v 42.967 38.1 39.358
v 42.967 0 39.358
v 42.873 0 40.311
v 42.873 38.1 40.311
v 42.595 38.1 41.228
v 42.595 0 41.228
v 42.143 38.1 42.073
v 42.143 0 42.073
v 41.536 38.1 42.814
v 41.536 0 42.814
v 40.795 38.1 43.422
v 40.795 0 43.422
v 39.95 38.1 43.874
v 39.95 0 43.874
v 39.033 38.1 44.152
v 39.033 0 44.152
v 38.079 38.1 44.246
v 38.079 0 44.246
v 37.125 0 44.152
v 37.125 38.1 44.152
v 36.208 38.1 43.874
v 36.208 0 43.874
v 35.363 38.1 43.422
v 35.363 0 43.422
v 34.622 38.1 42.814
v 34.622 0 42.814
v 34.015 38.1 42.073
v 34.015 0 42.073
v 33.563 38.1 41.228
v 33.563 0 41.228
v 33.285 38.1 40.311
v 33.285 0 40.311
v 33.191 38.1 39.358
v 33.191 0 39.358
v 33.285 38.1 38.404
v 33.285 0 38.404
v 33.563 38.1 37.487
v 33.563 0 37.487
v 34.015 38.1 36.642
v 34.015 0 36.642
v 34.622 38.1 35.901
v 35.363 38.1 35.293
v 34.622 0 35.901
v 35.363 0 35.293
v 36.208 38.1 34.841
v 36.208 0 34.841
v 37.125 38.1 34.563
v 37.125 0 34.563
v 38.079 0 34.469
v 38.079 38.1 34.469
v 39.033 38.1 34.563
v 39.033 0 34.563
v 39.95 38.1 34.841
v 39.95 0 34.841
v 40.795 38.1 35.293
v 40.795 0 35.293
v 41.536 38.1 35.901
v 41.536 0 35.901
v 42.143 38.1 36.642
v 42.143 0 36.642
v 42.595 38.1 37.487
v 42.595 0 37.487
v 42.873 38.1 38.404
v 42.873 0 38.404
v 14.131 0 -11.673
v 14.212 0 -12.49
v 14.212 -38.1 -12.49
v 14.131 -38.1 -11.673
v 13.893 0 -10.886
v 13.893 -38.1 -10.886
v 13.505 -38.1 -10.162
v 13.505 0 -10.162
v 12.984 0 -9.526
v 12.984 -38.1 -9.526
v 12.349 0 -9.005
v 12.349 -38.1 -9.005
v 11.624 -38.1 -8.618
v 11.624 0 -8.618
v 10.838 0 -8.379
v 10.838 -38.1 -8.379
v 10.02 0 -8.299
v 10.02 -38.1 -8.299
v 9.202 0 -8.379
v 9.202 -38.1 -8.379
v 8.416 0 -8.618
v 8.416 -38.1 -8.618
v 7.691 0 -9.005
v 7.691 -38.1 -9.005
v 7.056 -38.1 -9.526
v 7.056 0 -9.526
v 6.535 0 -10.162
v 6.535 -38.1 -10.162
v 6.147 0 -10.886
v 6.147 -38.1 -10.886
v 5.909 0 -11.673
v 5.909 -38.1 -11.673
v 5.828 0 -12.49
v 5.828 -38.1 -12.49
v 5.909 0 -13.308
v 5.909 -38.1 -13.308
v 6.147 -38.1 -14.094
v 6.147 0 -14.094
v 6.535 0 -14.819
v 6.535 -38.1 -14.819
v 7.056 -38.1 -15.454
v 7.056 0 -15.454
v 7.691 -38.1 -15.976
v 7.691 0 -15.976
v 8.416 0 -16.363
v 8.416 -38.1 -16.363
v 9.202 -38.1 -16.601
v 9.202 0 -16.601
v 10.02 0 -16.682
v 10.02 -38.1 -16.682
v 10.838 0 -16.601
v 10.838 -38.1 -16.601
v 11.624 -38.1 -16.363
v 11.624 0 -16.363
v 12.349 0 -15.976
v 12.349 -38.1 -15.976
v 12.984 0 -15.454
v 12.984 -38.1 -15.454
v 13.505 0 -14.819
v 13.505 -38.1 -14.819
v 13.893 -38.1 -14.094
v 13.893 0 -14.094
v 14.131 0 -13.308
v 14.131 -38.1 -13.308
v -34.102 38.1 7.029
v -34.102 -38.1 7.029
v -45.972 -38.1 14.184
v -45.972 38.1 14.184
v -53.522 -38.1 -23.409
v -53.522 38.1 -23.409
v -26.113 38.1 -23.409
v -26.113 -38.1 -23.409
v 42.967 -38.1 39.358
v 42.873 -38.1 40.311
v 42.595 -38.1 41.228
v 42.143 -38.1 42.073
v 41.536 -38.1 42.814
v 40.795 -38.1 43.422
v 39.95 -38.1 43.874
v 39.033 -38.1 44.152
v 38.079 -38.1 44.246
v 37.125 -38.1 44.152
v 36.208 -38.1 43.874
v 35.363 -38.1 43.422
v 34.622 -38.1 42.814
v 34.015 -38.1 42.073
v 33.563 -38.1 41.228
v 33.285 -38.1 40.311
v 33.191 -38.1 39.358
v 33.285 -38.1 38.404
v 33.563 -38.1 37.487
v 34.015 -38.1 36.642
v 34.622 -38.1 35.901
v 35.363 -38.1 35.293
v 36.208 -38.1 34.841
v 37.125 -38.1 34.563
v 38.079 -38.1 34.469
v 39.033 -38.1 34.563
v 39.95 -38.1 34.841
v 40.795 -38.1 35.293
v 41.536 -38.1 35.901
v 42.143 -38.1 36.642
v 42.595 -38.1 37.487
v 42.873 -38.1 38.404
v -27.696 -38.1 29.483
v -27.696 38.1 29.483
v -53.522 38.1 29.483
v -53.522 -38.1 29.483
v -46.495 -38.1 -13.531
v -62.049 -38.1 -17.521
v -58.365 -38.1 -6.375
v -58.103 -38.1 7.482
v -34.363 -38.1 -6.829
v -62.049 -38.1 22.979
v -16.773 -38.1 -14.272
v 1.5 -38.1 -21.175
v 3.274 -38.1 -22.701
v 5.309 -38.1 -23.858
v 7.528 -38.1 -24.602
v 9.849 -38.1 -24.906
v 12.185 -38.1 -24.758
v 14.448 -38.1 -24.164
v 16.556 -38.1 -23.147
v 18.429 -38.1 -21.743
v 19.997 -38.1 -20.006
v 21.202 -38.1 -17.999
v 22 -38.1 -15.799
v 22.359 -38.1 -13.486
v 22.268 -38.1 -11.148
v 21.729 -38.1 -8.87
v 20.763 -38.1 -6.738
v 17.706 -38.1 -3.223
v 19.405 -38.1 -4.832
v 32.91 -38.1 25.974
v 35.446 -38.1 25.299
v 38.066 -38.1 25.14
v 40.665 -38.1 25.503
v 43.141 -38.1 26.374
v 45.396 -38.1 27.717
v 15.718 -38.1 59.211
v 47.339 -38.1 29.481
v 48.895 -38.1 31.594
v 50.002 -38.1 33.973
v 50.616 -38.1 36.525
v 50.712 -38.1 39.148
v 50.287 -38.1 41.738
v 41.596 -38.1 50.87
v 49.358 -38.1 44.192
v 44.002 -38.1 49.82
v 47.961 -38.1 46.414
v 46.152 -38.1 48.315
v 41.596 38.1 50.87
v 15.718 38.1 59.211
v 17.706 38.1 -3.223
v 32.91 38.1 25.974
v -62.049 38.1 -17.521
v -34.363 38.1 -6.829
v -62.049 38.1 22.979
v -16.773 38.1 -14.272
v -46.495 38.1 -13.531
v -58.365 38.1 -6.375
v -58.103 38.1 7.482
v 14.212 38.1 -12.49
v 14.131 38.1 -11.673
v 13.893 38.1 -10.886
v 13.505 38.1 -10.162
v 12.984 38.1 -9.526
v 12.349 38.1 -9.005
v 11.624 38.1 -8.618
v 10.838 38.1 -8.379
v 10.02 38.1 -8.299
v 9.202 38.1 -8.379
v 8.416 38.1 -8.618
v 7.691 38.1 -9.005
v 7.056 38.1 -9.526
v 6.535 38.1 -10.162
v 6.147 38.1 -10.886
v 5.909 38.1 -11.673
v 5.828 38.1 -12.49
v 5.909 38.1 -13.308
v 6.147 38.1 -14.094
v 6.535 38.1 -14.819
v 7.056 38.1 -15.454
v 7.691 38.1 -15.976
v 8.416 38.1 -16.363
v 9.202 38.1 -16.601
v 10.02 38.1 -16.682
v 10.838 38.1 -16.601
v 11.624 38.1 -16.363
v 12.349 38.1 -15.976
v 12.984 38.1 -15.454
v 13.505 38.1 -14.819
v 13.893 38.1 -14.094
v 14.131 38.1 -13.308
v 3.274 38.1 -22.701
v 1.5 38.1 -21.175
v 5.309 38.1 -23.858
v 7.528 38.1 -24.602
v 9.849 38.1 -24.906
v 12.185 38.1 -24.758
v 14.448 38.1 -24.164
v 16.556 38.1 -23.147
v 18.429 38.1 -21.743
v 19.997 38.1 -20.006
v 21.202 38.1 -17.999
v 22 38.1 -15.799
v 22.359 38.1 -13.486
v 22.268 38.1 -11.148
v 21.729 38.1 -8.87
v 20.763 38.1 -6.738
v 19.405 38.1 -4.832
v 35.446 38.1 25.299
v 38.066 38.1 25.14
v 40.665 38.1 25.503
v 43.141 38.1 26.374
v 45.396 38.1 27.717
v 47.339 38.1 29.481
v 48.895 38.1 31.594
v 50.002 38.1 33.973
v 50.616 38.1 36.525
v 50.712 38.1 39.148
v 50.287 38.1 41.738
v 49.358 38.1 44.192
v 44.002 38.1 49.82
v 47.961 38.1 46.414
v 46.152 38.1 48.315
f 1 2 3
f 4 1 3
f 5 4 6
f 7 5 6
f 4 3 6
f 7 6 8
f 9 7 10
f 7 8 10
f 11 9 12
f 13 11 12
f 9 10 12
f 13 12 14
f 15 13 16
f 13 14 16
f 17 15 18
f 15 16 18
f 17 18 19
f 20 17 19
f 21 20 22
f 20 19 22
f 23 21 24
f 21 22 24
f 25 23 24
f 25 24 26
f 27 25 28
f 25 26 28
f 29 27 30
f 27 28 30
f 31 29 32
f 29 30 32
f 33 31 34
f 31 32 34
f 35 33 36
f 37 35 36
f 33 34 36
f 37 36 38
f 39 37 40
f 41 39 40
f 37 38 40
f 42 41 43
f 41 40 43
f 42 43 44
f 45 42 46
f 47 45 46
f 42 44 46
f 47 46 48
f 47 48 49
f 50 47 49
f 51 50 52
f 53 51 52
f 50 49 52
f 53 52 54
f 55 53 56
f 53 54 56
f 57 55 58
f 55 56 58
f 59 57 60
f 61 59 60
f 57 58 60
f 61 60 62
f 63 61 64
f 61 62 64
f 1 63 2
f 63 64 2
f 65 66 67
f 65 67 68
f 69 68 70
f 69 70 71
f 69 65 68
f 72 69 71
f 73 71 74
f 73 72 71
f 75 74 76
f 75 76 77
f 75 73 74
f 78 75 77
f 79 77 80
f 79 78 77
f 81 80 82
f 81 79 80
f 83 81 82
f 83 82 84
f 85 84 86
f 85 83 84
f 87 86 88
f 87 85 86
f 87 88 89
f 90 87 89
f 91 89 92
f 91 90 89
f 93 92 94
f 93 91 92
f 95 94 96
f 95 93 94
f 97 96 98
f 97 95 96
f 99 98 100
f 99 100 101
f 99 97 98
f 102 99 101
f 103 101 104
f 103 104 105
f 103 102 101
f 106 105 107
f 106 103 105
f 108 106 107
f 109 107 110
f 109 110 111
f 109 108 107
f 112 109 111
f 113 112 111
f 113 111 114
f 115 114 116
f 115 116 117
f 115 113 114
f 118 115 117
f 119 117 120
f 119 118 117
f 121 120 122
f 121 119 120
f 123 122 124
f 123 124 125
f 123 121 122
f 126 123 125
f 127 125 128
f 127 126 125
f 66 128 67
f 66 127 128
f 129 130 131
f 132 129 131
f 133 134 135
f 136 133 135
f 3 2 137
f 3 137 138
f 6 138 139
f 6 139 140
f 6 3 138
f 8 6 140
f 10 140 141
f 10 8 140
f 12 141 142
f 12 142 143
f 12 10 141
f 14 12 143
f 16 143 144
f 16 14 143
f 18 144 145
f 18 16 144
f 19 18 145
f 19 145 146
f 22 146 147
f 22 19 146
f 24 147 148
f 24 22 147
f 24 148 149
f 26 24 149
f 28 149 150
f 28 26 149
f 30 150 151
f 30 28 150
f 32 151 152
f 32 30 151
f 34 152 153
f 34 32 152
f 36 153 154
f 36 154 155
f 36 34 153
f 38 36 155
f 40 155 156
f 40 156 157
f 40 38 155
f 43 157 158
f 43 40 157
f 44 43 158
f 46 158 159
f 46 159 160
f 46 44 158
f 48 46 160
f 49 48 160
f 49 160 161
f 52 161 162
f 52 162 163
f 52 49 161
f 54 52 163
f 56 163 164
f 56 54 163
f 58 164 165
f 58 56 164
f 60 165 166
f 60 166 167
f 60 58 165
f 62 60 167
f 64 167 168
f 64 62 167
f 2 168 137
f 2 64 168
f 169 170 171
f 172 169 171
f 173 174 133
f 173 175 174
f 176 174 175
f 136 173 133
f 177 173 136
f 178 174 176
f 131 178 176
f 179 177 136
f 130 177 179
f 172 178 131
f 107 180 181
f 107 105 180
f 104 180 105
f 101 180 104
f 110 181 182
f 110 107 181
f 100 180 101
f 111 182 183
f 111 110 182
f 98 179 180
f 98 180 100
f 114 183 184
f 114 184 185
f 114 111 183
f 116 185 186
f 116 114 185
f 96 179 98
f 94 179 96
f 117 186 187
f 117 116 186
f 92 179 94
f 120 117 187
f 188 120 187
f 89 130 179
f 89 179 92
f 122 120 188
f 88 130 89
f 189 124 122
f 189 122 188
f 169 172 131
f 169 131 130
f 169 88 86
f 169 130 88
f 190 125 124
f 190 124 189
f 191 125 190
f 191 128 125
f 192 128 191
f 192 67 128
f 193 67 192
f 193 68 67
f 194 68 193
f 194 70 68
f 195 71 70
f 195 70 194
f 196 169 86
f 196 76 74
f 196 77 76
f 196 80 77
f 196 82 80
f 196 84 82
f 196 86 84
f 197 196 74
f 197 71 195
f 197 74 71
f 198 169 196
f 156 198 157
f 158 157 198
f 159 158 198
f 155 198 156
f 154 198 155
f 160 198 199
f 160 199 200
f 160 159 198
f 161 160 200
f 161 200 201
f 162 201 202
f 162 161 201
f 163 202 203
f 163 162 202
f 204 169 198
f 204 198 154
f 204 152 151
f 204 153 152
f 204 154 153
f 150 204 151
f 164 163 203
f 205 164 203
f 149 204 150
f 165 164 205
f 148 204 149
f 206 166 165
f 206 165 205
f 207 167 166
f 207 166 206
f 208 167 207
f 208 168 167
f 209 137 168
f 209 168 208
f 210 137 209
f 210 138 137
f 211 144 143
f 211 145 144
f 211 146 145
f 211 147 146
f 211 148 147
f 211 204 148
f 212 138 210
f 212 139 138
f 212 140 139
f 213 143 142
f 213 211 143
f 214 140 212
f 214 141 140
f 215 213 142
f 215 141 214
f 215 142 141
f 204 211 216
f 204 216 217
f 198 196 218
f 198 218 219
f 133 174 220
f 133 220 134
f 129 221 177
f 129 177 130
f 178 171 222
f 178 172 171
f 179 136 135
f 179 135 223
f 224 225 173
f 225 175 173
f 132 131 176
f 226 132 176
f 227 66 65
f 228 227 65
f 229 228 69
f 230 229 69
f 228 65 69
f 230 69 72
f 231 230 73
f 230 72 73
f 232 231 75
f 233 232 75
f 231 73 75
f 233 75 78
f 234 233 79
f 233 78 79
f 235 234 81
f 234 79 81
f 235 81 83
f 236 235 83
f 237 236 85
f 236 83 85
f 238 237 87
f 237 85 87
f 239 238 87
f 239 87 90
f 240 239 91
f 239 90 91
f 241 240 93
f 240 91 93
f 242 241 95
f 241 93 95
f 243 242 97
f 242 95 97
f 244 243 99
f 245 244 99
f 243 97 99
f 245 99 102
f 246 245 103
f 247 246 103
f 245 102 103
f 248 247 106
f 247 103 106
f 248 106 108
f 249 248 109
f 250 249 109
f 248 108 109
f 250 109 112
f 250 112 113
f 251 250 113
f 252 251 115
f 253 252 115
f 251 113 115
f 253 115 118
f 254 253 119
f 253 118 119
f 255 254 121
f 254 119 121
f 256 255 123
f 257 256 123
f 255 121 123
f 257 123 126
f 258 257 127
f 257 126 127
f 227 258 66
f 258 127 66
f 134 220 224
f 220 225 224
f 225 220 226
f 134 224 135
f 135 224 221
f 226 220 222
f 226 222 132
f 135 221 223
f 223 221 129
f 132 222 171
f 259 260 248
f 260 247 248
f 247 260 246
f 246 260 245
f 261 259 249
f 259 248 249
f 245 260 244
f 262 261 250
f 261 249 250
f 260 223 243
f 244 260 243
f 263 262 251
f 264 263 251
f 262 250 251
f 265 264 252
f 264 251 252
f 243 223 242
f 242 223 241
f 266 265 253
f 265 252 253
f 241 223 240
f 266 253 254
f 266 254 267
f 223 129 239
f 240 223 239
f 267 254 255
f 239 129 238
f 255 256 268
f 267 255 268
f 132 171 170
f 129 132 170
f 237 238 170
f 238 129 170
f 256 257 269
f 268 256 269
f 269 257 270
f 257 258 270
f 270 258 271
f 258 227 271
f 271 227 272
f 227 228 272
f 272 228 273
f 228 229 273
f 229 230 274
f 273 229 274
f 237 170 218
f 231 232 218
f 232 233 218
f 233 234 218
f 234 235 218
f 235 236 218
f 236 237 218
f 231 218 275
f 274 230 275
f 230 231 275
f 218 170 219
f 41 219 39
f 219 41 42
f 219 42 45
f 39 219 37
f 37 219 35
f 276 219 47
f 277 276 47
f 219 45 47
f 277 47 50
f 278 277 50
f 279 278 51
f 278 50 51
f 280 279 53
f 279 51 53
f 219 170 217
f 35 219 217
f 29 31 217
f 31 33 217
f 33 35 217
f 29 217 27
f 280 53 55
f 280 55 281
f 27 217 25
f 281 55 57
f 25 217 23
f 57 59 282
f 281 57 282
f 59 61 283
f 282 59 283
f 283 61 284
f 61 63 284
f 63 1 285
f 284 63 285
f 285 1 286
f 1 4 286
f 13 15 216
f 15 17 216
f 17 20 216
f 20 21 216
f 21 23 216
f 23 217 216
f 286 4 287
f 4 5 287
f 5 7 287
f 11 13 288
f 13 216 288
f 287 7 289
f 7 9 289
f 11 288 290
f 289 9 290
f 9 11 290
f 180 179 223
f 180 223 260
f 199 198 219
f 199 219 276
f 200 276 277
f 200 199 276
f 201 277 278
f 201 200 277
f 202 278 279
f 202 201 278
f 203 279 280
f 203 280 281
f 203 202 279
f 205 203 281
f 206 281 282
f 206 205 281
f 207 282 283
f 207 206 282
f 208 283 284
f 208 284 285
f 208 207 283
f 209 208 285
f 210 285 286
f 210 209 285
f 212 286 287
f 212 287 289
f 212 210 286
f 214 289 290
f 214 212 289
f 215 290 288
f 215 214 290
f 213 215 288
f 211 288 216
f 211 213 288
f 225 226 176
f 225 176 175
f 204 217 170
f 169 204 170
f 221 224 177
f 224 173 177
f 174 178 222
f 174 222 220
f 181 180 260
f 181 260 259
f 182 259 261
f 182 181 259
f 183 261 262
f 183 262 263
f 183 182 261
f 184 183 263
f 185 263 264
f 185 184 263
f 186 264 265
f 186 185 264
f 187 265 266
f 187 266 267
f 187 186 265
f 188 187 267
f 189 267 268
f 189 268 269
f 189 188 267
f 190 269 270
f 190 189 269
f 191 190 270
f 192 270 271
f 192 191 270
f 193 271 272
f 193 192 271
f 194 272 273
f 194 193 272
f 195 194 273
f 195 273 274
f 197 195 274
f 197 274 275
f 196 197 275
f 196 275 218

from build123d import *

# Parameters (mm, degrees)
F2_DEPTH = 38.1
F1_R     = 4.191664
F1_R_2   = 4.888278
F3_DEPTH = 38.1


with BuildPart() as f2:
    # F0 (on Front) → F2 (new body, symmetric)
    with BuildSketch(Plane.XZ):
        with BuildLine():
            Line((-53.521972, 29.483171), (-62.049322, 22.979138))
            Line((-62.049322, 22.979138), (-62.049322, -17.520668))
            Line((-62.049322, -17.520668), (-53.521972, -23.408599))
            Line((-53.521972, -23.408599), (-26.112633, -23.408599))
            Line((-26.112633, -23.408599), (-16.773155, -14.272154))
            Line((-16.773155, -14.272154), (1.499737, -21.175247))
            ThreePointArc((1.499737, -21.175247), (19.255094, -20.912232), (17.705545, -3.222666))
            Line((17.705545, -3.222666), (32.90997, 25.973593))
            ThreePointArc((32.90997, 25.973593), (50.002283, 33.973494), (41.596282, 50.869786))
            Line((41.596282, 50.869786), (15.718478, 59.210562))
            Line((15.718478, 59.210562), (-27.696349, 29.483171))
            Line((-27.696349, 29.483171), (-53.521972, 29.483171))
        make_face()
    extrude(amount=F2_DEPTH, both=True)

    # F1 (on face) → F3 (cut, symmetric)
    with BuildSketch(Plane.XZ):
        with Locations((10.020046, -12.490342)):
            Circle(F1_R)
        with Locations((38.078971, 39.35767)):
            Circle(F1_R_2)
        Polygon((-46.49493, -13.530695), (-34.363216, -6.82854), (-34.101594, 7.02891), (-45.971688, 14.184206), (-58.103403, 7.482052), (-58.365024, -6.375399), align=None)
    extrude(amount=F3_DEPTH, both=True, mode=Mode.SUBTRACT)


solid = f2.part
